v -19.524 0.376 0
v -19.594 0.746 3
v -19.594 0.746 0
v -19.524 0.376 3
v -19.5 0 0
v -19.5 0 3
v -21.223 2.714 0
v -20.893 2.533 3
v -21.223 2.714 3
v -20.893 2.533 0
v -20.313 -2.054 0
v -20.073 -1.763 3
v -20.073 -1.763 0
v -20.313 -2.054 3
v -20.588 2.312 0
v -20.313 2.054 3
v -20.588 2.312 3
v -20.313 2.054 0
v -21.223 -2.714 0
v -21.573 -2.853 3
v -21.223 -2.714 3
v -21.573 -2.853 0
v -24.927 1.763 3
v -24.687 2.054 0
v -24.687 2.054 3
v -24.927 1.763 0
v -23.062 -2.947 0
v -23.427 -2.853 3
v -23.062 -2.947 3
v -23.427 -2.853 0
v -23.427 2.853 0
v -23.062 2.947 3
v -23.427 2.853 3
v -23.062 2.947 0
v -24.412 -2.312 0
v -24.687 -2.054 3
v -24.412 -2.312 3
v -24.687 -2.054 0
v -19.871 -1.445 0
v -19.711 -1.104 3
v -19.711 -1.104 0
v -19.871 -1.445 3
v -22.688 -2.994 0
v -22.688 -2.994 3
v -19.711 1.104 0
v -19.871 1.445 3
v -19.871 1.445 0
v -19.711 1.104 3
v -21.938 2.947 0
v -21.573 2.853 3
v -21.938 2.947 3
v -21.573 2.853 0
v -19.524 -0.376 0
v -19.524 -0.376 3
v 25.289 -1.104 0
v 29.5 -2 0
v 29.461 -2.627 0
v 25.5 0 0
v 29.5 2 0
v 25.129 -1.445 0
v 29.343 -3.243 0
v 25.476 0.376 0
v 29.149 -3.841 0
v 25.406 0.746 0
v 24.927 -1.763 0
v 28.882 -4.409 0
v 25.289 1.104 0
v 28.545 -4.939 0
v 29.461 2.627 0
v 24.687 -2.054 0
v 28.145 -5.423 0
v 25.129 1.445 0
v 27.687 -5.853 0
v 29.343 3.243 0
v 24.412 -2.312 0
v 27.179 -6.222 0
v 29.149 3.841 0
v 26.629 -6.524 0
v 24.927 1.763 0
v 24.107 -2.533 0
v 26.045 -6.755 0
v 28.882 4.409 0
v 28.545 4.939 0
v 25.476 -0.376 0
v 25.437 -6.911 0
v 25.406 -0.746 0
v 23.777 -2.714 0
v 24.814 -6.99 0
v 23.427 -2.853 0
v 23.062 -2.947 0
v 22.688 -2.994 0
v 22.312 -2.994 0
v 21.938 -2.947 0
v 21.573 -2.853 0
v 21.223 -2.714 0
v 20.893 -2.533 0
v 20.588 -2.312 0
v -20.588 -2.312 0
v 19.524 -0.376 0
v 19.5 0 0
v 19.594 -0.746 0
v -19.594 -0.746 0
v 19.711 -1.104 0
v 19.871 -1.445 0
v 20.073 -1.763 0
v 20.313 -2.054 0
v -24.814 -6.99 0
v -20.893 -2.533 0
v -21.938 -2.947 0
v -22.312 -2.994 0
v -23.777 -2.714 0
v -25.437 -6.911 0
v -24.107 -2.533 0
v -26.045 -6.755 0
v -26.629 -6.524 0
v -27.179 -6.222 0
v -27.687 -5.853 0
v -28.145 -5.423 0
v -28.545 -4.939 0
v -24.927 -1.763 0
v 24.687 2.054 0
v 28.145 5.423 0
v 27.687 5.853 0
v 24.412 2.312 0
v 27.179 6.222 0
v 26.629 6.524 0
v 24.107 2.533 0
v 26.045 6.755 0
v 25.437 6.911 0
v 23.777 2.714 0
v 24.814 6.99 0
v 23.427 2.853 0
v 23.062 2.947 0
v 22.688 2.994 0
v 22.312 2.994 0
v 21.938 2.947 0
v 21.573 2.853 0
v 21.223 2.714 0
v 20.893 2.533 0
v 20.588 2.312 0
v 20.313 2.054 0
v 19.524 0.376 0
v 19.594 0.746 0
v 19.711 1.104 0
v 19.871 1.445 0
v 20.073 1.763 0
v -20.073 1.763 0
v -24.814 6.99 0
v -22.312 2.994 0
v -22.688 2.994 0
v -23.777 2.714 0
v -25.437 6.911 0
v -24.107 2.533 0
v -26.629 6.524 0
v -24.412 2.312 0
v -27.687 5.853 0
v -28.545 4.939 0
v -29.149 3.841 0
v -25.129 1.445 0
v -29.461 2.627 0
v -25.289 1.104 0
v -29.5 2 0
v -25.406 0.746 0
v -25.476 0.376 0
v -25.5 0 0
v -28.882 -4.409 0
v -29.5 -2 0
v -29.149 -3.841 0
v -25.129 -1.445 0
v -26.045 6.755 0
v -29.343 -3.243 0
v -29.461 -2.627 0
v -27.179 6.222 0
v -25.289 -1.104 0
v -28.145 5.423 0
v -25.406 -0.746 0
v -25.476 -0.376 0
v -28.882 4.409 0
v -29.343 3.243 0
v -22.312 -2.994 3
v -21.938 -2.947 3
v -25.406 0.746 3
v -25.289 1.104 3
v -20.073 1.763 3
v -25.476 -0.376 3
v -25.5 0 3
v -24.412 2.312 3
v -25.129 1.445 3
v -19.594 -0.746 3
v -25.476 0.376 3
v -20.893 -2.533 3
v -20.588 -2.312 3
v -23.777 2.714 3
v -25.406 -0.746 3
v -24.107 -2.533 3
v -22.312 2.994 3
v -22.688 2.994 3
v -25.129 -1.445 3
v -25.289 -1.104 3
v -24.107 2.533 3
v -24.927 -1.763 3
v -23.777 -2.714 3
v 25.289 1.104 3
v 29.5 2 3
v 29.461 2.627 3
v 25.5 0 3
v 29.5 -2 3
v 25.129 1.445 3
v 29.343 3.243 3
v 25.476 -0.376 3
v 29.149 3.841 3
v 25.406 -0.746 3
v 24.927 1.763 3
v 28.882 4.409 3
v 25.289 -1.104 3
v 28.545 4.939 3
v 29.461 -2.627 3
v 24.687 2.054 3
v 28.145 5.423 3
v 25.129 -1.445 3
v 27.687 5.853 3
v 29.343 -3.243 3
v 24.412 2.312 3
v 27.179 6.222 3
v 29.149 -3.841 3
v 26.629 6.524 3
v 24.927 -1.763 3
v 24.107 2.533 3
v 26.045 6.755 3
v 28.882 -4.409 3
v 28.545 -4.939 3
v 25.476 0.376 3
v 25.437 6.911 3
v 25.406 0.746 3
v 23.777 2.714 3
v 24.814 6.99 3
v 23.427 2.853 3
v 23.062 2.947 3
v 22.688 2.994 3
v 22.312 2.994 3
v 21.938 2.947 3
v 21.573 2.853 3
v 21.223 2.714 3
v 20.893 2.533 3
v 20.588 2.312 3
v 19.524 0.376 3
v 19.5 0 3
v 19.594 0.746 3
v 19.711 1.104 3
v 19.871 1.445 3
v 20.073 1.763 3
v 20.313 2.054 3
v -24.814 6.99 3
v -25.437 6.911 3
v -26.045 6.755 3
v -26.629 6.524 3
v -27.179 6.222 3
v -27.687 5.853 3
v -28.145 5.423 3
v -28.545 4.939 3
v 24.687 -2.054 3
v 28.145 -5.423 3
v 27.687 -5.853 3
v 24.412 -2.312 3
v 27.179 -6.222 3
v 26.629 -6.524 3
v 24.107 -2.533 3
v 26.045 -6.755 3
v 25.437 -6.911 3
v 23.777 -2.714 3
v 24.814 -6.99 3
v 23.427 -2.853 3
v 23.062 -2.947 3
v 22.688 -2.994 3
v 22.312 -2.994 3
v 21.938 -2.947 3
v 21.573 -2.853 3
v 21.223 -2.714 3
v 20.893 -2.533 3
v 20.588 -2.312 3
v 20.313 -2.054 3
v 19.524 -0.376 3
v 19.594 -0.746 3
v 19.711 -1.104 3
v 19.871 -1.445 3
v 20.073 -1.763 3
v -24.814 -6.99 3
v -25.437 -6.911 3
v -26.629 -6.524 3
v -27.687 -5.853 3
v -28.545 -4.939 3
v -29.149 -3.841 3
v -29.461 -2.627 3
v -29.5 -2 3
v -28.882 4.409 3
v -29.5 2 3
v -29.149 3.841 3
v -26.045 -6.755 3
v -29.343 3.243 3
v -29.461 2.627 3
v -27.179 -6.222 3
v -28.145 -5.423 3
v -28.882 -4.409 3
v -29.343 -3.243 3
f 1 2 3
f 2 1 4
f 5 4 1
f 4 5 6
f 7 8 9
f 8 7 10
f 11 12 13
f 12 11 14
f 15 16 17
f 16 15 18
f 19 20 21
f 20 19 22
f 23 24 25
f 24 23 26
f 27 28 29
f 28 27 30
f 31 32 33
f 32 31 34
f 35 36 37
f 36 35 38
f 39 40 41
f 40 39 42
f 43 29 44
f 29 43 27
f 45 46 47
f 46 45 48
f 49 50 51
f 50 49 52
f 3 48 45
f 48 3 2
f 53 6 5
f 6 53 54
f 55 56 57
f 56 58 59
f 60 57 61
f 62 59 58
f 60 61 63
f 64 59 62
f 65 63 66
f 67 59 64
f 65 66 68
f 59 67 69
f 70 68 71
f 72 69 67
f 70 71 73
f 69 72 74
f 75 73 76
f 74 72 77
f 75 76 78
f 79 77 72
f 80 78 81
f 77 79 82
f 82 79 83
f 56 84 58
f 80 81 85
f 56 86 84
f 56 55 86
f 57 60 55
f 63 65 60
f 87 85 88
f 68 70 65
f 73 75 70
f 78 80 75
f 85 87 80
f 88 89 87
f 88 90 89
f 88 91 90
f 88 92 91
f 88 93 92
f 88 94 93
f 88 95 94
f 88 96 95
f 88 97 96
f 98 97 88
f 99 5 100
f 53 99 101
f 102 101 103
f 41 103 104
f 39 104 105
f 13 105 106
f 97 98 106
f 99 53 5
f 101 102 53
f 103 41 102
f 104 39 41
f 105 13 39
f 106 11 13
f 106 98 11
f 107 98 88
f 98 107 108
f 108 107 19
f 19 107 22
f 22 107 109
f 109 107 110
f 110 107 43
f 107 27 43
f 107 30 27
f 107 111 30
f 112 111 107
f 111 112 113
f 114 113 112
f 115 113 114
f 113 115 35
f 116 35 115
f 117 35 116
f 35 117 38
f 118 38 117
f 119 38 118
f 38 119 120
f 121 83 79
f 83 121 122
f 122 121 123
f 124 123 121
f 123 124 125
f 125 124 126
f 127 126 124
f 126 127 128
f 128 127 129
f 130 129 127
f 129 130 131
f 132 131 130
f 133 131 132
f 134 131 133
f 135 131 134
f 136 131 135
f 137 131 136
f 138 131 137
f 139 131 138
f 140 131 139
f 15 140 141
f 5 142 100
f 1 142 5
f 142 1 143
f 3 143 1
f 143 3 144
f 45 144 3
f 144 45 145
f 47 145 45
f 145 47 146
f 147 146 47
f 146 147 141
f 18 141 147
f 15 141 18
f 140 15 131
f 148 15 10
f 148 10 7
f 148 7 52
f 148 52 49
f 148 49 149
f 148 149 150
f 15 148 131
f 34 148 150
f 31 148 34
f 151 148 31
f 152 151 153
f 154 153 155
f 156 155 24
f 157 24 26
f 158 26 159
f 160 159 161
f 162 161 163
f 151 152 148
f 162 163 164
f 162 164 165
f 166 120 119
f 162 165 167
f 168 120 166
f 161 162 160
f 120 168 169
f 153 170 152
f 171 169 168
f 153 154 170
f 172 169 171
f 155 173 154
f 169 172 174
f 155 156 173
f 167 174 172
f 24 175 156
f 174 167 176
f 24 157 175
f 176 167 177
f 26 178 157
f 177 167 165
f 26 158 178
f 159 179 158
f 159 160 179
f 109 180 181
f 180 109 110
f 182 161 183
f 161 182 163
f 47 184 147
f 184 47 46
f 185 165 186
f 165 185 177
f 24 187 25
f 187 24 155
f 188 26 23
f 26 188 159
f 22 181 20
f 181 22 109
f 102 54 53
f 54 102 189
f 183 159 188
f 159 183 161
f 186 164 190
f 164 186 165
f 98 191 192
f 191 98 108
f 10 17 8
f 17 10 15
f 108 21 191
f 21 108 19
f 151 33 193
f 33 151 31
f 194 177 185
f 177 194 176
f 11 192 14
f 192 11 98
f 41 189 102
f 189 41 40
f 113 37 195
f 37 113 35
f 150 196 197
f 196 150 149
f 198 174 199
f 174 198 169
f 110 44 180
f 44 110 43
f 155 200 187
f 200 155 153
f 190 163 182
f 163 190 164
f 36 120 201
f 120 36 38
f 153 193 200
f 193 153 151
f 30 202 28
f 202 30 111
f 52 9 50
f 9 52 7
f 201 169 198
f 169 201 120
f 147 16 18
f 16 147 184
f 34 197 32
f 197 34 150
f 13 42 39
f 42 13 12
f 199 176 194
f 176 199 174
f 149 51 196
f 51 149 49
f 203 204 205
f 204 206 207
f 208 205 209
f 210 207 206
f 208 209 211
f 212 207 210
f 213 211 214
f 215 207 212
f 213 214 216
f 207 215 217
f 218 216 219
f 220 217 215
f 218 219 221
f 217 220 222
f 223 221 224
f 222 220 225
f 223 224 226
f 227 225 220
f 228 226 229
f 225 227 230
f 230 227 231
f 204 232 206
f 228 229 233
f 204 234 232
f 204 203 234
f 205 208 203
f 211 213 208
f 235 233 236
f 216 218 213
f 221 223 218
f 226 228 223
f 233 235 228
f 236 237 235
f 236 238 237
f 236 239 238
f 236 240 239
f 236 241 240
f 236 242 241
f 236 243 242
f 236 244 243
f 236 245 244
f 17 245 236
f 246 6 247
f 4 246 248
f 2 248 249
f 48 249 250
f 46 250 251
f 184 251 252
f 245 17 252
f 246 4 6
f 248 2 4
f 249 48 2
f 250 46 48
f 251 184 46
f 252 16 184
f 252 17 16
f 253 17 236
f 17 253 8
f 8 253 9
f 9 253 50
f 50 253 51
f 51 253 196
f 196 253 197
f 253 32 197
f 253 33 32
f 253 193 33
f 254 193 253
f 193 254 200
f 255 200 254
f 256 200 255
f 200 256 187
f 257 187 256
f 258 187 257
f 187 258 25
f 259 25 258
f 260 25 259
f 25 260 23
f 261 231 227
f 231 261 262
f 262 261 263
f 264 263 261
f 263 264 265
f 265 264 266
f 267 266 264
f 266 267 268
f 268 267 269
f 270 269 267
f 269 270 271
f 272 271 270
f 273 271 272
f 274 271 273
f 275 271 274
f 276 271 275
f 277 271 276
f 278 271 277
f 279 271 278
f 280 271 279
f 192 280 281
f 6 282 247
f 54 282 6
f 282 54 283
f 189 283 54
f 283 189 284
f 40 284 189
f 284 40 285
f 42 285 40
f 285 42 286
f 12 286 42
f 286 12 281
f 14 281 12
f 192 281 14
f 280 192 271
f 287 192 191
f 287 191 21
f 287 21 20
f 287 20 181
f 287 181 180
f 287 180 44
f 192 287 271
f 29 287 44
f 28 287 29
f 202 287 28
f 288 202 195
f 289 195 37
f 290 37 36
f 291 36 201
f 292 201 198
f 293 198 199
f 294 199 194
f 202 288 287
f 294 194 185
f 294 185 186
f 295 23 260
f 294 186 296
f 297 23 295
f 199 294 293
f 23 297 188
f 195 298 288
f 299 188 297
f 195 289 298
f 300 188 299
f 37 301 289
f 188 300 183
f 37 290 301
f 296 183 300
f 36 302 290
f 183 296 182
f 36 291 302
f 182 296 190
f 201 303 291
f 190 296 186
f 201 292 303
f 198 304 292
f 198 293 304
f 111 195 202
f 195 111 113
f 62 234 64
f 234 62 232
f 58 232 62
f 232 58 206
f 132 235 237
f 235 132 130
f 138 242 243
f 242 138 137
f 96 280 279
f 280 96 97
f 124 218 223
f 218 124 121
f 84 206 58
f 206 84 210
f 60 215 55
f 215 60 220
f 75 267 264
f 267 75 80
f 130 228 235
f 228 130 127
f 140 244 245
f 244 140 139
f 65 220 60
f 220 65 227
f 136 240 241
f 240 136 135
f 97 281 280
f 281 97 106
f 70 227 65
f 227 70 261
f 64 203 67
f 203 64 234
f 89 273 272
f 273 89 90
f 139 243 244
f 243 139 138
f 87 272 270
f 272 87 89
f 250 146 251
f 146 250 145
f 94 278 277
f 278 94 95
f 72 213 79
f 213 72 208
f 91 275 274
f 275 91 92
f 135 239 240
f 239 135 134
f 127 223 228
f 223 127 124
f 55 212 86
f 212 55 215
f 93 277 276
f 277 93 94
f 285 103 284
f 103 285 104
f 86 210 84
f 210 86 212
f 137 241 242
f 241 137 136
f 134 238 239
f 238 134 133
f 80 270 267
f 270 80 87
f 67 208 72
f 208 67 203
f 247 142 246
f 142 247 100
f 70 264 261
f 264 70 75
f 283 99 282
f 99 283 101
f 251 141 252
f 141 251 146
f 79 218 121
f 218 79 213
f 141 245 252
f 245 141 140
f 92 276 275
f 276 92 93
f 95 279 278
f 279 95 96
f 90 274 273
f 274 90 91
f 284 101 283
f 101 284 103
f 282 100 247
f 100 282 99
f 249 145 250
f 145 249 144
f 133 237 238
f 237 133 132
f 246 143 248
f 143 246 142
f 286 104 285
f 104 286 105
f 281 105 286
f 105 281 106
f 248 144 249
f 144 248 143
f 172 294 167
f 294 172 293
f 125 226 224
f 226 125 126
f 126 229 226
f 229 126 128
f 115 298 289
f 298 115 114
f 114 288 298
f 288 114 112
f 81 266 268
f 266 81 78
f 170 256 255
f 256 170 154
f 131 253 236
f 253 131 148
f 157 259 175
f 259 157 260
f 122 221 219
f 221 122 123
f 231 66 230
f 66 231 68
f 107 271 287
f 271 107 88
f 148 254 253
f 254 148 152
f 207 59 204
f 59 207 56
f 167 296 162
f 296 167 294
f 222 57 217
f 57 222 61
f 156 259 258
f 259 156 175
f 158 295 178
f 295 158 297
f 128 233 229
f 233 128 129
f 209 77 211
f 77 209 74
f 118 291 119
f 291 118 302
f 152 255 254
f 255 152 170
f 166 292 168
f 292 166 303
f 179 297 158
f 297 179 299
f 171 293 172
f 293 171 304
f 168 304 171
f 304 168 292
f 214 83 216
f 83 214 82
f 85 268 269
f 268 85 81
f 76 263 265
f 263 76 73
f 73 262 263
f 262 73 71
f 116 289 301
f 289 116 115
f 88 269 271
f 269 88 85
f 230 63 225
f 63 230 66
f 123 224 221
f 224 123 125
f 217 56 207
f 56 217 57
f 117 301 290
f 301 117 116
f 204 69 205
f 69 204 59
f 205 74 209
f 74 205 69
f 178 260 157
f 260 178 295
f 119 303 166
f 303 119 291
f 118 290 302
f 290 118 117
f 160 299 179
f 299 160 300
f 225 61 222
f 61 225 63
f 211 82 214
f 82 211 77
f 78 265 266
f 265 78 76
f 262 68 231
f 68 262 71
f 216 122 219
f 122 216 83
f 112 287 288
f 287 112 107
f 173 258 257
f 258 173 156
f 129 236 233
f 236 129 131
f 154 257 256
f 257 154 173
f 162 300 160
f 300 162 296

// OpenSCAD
$fn = 50;


difference() {
	union() {
		hull() {
			translate(v = [-24.5000000000, 2.0000000000, 0]) {
				cylinder(h = 3, r = 5);
			}
			translate(v = [24.5000000000, 2.0000000000, 0]) {
				cylinder(h = 3, r = 5);
			}
			translate(v = [-24.5000000000, -2.0000000000, 0]) {
				cylinder(h = 3, r = 5);
			}
			translate(v = [24.5000000000, -2.0000000000, 0]) {
				cylinder(h = 3, r = 5);
			}
		}
	}
	union() {
		translate(v = [-22.5000000000, 0.0000000000, 0]) {
			cylinder(h = 3, r = 3.0000000000);
		}
		translate(v = [22.5000000000, 0.0000000000, 0]) {
			cylinder(h = 3, r = 3.0000000000);
		}
		translate(v = [-22.5000000000, 0.0000000000, 0]) {
			cylinder(h = 3, r = 1.5000000000);
		}
		translate(v = [22.5000000000, 0.0000000000, 0]) {
			cylinder(h = 3, r = 1.5000000000);
		}
		translate(v = [-22.5000000000, 0.0000000000, 0]) {
			cylinder(h = 3, r = 1.5000000000);
		}
		translate(v = [22.5000000000, 0.0000000000, 0]) {
			cylinder(h = 3, r = 1.5000000000);
		}
		translate(v = [-22.5000000000, 0.0000000000, 0]) {
			cylinder(h = 3, r = 1.5000000000);
		}
		translate(v = [22.5000000000, 0.0000000000, 0]) {
			cylinder(h = 3, r = 1.5000000000);
		}
	}
}
